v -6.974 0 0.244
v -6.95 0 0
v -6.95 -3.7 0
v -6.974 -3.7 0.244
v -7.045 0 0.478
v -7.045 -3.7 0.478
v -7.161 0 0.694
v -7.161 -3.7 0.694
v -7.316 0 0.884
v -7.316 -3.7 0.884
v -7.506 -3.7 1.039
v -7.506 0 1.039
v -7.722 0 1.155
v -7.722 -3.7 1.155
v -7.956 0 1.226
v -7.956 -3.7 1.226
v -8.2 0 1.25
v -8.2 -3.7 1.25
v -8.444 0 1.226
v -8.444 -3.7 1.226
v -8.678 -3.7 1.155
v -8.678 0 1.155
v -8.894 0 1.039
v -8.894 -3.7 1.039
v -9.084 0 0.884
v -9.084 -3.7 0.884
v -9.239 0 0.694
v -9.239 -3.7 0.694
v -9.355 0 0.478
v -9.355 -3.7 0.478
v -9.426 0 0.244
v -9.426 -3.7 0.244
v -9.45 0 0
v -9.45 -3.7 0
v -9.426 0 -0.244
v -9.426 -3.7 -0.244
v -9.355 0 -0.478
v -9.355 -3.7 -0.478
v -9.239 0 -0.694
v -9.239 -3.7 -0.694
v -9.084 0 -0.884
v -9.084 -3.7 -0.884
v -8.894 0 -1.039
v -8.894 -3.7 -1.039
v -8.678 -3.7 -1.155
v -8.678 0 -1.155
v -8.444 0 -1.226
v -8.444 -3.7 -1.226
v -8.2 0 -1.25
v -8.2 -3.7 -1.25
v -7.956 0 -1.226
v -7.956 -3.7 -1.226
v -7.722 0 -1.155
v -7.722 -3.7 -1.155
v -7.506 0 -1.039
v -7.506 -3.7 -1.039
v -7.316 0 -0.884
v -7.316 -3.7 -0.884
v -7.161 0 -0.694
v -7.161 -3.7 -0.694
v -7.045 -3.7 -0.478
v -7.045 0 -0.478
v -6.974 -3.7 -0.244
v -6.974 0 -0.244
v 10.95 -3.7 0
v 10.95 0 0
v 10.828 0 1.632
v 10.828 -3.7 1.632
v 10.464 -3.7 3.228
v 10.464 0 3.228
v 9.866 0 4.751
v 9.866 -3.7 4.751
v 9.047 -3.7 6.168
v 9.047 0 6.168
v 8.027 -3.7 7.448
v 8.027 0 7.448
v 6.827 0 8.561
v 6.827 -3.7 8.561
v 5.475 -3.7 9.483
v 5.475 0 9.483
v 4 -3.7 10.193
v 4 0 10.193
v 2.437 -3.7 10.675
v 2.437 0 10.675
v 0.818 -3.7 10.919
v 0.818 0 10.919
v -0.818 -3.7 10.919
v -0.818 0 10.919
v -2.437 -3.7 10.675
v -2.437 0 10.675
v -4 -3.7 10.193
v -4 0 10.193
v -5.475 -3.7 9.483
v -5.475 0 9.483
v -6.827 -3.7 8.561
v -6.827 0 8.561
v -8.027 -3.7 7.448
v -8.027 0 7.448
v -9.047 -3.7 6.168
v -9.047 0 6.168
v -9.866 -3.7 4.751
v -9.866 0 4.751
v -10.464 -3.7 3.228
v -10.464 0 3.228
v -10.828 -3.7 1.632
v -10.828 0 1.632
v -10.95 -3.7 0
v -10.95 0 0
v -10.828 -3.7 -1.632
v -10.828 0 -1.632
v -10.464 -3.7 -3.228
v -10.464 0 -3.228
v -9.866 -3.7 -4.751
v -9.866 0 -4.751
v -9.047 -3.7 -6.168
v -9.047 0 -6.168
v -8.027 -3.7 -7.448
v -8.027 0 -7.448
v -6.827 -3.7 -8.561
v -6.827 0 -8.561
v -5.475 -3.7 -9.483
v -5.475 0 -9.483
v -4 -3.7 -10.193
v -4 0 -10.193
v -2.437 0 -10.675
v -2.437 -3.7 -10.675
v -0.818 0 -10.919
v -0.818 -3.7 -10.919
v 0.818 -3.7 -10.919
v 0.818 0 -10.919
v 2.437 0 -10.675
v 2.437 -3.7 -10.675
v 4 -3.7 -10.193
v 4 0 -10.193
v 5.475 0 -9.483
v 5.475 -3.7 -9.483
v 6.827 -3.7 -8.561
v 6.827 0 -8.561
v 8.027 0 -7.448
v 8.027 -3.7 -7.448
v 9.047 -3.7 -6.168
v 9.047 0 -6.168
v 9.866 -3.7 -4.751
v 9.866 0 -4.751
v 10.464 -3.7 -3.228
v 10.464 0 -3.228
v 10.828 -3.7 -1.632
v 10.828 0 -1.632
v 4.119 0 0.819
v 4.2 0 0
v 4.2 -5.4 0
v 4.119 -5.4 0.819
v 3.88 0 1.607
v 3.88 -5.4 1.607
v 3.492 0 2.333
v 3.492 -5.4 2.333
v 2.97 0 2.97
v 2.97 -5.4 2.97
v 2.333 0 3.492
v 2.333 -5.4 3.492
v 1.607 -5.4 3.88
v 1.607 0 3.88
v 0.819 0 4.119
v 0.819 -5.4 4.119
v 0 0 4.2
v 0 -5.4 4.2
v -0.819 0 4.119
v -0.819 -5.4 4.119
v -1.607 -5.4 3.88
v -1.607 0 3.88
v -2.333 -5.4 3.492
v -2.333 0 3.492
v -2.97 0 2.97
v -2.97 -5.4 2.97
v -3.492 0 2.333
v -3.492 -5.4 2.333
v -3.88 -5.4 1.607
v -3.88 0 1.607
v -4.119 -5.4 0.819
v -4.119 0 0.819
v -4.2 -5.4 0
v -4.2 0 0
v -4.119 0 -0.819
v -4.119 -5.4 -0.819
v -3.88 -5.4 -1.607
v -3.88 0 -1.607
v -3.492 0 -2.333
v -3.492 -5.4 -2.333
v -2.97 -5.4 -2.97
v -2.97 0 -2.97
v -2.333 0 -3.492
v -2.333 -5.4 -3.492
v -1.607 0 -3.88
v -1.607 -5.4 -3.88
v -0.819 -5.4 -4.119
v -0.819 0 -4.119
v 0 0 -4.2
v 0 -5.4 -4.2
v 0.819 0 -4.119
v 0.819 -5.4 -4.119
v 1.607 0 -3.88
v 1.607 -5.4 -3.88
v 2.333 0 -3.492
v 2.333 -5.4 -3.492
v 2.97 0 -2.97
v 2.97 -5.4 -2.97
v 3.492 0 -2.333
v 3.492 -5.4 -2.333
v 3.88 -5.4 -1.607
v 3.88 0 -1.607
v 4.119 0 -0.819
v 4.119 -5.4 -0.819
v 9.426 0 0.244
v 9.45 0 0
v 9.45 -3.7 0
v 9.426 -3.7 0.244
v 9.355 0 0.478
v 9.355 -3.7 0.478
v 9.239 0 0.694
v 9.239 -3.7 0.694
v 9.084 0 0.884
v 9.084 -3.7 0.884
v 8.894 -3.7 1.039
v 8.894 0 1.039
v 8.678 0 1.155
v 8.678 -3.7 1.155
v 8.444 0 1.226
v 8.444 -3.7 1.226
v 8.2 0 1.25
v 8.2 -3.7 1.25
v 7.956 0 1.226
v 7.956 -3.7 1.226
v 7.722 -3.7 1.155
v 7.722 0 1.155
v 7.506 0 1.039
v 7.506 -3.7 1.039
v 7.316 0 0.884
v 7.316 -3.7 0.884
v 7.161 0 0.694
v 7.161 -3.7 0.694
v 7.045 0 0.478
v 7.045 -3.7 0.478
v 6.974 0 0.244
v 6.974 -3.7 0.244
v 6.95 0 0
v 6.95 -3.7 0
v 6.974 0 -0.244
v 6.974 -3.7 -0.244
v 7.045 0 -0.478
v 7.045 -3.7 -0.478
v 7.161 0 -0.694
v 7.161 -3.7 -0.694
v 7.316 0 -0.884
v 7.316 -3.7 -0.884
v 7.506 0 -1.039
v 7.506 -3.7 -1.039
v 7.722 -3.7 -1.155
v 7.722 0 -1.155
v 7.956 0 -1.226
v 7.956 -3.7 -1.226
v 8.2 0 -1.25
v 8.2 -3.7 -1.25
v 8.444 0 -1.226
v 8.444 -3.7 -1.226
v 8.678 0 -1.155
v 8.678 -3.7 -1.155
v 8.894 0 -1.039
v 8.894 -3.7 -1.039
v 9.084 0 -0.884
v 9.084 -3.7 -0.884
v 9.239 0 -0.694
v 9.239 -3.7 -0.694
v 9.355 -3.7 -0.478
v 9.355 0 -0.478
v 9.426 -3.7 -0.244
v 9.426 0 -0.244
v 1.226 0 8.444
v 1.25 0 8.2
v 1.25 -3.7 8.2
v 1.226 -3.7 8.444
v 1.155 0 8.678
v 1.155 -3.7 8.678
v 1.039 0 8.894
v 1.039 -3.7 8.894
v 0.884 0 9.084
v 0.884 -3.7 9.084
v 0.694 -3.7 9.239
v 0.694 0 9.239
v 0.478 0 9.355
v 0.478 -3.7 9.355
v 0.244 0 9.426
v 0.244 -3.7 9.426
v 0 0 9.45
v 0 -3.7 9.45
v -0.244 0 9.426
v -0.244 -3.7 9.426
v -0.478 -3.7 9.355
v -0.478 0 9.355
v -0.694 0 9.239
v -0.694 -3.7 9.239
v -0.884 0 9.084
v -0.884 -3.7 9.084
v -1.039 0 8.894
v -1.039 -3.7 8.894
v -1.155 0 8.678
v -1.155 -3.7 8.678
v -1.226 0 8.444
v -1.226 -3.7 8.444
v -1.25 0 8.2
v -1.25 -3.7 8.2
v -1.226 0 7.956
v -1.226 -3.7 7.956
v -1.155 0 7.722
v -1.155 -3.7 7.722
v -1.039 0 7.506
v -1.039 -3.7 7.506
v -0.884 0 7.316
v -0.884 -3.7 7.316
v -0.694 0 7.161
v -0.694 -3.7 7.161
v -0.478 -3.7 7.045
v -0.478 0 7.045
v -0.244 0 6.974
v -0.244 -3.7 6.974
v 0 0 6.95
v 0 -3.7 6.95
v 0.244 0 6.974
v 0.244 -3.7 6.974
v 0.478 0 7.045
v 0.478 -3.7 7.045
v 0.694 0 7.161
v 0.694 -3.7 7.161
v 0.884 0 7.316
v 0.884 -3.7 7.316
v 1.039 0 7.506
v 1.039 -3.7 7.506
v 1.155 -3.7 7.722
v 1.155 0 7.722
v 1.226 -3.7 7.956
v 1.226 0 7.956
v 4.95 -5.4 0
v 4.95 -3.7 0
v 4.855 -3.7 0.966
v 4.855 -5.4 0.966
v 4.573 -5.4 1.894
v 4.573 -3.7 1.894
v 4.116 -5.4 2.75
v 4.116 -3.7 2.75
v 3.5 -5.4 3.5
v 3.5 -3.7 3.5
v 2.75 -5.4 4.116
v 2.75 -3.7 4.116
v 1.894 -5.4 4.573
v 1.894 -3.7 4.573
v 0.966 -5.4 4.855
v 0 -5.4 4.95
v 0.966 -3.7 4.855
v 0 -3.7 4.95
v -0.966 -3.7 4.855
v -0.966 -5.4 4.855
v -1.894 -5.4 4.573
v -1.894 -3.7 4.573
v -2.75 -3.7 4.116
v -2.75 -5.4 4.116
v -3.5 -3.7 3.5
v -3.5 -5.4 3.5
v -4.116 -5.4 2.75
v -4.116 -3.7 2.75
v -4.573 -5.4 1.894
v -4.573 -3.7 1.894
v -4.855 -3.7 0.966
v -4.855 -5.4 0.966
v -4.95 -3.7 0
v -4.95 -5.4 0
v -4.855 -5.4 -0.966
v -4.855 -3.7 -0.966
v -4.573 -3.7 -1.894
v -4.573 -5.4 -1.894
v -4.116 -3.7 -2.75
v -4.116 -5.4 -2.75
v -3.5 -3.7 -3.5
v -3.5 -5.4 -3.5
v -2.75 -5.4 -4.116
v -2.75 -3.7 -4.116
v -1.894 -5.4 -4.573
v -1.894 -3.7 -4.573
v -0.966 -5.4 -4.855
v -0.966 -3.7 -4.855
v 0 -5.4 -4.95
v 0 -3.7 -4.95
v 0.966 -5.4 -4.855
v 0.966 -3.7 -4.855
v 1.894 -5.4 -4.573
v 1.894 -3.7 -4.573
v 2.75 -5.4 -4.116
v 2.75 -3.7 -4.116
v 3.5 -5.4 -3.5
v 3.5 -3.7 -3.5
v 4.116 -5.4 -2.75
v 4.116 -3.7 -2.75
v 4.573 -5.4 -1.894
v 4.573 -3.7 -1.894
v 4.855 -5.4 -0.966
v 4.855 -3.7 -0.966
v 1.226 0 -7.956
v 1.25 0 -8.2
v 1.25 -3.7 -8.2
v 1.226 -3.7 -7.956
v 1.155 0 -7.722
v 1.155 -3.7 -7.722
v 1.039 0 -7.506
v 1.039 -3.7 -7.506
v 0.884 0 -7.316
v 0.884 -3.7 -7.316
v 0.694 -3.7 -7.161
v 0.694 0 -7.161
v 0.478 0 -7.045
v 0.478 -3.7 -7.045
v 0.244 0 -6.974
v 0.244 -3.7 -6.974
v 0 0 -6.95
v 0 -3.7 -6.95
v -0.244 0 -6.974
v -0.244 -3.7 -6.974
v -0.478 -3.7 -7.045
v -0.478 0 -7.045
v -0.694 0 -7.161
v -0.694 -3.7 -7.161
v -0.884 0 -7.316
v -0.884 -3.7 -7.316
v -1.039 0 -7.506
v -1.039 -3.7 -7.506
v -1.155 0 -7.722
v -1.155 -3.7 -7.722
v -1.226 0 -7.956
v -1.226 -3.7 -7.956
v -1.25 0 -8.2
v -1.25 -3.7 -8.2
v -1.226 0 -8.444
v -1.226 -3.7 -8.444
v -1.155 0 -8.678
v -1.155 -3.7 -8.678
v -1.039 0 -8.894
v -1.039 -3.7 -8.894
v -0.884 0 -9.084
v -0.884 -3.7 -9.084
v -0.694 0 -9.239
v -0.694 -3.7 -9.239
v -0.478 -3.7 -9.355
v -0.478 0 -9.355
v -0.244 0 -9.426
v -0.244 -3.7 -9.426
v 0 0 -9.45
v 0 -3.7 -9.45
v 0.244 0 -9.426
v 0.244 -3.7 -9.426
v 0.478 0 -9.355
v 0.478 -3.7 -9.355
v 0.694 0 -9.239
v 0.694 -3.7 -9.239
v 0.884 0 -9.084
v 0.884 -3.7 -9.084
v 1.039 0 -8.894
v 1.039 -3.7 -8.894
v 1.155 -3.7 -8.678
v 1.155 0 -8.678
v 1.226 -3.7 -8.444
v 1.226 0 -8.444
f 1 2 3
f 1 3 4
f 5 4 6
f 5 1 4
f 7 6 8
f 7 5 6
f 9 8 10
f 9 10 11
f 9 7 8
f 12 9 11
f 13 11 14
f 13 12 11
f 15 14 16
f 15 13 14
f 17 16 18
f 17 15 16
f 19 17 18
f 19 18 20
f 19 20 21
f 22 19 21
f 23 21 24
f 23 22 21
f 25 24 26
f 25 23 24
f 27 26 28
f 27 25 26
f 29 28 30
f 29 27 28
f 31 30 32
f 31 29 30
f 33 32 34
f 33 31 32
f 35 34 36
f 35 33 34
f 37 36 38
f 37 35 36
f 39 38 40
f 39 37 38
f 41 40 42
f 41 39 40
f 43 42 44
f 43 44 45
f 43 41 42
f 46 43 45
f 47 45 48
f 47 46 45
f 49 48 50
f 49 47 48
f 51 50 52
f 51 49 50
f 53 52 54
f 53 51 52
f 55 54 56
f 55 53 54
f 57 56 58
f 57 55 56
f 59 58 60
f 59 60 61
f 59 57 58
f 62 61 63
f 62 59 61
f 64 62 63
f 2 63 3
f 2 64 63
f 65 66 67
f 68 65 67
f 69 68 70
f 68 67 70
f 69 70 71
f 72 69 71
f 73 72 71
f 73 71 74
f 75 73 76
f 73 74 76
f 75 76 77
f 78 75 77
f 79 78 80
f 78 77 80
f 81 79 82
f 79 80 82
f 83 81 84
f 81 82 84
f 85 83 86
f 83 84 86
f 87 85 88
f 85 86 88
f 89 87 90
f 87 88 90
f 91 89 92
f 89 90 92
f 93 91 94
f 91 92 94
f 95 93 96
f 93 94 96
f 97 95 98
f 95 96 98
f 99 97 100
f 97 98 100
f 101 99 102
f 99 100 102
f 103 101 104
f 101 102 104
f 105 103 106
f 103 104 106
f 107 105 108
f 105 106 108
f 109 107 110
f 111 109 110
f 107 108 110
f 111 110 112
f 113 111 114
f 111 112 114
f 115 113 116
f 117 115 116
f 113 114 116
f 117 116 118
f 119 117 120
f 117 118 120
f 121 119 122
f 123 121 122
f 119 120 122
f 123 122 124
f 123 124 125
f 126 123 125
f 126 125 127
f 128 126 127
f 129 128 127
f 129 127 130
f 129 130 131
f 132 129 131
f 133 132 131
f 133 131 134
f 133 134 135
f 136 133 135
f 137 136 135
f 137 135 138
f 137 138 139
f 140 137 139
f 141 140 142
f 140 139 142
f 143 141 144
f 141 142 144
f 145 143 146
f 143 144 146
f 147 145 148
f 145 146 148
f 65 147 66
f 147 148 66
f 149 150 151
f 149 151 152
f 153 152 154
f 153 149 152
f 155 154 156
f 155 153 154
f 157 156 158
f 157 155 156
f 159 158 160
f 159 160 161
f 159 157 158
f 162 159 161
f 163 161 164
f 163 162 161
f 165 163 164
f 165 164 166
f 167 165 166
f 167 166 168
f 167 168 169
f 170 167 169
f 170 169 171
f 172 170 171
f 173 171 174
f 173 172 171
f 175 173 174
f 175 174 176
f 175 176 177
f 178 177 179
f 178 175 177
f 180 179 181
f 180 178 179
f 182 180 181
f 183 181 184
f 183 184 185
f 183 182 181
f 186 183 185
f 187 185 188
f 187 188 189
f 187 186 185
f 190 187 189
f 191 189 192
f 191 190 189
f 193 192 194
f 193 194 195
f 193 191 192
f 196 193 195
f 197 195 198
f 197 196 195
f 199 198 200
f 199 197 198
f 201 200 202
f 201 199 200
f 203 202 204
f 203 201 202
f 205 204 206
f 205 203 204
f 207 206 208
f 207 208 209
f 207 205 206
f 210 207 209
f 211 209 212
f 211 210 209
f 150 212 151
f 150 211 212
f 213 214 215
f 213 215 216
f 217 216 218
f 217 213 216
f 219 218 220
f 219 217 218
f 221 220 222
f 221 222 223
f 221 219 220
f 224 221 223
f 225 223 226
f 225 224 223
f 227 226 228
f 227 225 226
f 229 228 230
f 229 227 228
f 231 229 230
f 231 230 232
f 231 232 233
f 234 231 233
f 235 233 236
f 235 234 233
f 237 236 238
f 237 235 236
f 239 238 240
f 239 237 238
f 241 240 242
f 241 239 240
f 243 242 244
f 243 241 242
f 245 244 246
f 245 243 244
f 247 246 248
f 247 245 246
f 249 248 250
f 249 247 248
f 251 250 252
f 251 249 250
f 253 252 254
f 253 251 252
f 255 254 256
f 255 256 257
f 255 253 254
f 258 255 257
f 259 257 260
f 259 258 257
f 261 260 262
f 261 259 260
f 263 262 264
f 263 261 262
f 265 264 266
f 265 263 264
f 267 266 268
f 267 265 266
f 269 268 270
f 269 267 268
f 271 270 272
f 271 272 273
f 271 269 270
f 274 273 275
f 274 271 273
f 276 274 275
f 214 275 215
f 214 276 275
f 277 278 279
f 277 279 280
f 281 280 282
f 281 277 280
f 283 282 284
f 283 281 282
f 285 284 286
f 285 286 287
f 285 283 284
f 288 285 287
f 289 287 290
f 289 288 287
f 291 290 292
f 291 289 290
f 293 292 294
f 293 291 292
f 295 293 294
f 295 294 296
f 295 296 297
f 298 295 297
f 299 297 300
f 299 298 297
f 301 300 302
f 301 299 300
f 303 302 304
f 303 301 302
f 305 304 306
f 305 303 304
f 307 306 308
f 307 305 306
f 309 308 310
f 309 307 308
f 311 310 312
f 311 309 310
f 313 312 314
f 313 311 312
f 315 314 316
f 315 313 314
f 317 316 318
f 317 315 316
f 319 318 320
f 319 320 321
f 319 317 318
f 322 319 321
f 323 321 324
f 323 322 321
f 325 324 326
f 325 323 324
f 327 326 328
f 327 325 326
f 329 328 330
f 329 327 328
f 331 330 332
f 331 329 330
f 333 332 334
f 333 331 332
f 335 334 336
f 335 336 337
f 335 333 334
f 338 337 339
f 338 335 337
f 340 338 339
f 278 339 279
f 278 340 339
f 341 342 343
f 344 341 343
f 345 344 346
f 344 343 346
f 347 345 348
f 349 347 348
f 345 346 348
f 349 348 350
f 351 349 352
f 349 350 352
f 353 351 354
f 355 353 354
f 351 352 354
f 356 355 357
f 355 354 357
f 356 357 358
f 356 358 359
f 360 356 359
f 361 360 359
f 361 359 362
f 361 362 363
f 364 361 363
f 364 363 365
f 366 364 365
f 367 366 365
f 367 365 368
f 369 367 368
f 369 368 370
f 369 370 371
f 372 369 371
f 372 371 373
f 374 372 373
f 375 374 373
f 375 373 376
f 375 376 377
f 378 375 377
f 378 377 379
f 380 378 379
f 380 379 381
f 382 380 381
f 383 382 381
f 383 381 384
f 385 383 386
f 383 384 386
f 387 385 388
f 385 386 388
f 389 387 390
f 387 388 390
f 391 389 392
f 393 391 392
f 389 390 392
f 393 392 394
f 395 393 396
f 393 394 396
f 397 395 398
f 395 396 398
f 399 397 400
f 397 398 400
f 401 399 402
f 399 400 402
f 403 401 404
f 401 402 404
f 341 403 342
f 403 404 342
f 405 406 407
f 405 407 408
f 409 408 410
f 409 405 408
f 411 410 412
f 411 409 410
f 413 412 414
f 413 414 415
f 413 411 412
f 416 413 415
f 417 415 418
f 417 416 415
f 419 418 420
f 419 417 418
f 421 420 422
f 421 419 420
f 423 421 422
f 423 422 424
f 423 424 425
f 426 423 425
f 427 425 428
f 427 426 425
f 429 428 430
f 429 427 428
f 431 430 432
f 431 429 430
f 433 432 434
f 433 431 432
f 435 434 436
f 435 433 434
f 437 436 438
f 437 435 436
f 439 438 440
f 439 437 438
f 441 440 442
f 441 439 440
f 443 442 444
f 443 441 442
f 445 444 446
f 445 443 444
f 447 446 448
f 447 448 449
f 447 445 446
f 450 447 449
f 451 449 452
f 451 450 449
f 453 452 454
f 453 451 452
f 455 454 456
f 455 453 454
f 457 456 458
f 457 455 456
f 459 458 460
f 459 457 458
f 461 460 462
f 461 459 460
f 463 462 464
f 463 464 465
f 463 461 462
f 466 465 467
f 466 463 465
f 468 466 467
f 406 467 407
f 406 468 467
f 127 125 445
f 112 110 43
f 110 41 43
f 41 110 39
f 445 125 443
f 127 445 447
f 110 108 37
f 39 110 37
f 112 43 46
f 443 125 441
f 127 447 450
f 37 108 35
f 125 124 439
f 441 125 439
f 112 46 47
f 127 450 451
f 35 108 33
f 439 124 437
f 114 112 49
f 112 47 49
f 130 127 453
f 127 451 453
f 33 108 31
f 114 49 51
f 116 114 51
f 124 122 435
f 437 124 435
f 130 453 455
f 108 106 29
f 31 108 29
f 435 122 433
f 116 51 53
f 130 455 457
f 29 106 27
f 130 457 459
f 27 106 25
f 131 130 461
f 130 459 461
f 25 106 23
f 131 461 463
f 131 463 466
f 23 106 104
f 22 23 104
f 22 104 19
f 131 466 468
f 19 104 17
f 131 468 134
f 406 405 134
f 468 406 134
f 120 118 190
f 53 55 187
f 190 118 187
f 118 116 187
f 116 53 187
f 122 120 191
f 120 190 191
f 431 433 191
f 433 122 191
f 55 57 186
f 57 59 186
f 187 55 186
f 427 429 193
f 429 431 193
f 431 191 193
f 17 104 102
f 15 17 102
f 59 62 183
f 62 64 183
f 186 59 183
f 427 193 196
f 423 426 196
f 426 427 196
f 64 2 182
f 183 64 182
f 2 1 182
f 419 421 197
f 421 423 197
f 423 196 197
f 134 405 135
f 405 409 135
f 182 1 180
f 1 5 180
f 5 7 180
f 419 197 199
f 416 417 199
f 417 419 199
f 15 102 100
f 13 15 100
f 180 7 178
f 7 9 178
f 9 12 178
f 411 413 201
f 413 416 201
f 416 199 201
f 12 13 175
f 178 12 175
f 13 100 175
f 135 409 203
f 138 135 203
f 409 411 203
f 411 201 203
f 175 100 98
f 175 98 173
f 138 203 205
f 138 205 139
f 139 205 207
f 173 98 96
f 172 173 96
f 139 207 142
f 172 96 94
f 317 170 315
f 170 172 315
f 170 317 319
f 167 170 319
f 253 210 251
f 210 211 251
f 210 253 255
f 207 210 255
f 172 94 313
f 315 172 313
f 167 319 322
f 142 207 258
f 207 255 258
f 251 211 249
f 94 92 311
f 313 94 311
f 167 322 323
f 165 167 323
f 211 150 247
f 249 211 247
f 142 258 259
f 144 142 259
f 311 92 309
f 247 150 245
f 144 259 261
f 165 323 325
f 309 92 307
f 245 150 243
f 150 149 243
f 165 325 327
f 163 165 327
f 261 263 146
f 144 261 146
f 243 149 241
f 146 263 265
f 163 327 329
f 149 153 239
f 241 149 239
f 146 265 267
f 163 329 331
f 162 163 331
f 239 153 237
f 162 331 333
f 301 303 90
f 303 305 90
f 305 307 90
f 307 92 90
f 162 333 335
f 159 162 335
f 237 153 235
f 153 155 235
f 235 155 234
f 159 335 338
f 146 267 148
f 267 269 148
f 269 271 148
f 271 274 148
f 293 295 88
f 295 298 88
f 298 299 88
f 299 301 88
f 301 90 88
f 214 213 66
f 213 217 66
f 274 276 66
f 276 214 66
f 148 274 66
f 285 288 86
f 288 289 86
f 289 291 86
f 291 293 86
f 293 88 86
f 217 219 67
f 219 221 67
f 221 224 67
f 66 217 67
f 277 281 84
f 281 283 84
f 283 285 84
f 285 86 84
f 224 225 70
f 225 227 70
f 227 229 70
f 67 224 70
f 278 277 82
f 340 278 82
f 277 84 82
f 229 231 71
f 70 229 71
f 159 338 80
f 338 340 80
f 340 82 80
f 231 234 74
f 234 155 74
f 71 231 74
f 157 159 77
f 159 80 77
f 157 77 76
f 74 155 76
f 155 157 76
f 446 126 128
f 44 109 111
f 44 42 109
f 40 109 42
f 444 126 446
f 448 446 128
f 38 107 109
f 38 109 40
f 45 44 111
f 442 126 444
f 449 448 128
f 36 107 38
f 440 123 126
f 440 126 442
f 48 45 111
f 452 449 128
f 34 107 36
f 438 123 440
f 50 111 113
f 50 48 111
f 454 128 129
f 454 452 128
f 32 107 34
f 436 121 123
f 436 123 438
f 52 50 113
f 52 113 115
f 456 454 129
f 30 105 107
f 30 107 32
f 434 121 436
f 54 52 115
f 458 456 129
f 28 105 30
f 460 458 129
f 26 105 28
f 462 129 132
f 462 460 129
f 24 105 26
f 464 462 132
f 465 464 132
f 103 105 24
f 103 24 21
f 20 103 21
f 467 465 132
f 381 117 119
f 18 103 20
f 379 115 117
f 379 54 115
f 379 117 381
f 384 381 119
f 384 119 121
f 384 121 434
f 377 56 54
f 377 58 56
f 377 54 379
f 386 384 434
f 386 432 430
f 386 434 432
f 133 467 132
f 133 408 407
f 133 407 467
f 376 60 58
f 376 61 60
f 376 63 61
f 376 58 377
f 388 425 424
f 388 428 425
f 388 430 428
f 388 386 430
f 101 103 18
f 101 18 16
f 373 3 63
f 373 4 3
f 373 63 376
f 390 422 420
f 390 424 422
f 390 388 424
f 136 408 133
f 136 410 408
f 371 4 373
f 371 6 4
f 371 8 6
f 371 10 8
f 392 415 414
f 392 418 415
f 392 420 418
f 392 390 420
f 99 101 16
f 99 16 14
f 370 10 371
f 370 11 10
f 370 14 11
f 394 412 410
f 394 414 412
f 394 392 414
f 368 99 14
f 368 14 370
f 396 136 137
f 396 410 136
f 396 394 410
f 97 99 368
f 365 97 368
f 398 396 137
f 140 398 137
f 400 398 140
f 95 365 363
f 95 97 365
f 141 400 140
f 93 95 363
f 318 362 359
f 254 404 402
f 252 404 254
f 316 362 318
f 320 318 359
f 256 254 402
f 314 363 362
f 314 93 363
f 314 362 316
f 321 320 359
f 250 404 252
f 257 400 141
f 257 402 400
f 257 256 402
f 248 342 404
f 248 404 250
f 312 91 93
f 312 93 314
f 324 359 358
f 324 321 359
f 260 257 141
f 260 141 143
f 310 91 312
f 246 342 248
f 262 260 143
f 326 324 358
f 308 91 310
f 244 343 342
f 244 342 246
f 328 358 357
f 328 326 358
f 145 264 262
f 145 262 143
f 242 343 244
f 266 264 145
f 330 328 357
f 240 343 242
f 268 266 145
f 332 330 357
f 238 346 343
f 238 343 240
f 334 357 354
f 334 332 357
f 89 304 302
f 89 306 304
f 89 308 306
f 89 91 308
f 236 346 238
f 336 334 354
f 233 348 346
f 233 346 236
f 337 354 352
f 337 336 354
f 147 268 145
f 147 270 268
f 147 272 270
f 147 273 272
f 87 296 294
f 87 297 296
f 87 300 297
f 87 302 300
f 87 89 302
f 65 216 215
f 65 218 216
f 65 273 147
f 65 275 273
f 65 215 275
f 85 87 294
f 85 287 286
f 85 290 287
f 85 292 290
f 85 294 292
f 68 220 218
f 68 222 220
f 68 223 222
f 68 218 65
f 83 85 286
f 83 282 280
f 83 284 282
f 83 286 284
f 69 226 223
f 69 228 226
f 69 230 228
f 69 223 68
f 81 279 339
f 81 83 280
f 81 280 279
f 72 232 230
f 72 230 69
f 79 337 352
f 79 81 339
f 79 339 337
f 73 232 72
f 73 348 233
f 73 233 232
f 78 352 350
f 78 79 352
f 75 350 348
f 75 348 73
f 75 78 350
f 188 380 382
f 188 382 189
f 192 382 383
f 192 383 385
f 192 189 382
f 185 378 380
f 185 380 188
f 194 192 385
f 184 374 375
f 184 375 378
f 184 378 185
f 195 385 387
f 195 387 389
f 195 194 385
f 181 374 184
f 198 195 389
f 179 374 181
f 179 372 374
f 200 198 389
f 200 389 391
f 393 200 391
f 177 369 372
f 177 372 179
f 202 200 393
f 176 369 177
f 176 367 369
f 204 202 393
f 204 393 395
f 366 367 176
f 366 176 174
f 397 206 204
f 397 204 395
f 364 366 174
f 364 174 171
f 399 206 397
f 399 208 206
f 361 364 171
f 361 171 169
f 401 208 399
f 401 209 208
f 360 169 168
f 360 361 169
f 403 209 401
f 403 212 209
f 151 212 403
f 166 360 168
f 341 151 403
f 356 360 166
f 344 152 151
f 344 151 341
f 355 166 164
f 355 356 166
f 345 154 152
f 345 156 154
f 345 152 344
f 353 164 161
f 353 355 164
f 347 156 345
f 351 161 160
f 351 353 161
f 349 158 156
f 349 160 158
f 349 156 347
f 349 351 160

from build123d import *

# Parameters (mm, degrees)
F0_R     = 4.95
F0_R_2   = 4.2
F1_DEPTH = 5.4
F0_R_3   = 10.95
F0_R_4   = 1.25
F2_DEPTH = 3.7


# Not quite as in the source:
# - the program builds the solid bodies; features that only make, move or delete a surface that nothing else refers to are left out


with BuildPart() as f1:
    # F0 (on Front) → F1 (new body)
    with BuildSketch(Plane.XZ):
        Circle(F0_R)
        Circle(F0_R_2, mode=Mode.SUBTRACT)
    extrude(amount=F1_DEPTH)

    # F0 (on Front) → F2 (join)
    with BuildSketch(Plane.XZ):
        Circle(F0_R_3)
        with Locations((0, -8.2)):
            Circle(F0_R_4, mode=Mode.SUBTRACT)
        with Locations((-8.2, 0)):
            Circle(F0_R_4, mode=Mode.SUBTRACT)
        Circle(F0_R, mode=Mode.SUBTRACT)
        with Locations((8.2, 0)):
            Circle(F0_R_4, mode=Mode.SUBTRACT)
        with Locations((0, 8.2)):
            Circle(F0_R_4, mode=Mode.SUBTRACT)
    extrude(amount=F2_DEPTH)


solid = f1.part
